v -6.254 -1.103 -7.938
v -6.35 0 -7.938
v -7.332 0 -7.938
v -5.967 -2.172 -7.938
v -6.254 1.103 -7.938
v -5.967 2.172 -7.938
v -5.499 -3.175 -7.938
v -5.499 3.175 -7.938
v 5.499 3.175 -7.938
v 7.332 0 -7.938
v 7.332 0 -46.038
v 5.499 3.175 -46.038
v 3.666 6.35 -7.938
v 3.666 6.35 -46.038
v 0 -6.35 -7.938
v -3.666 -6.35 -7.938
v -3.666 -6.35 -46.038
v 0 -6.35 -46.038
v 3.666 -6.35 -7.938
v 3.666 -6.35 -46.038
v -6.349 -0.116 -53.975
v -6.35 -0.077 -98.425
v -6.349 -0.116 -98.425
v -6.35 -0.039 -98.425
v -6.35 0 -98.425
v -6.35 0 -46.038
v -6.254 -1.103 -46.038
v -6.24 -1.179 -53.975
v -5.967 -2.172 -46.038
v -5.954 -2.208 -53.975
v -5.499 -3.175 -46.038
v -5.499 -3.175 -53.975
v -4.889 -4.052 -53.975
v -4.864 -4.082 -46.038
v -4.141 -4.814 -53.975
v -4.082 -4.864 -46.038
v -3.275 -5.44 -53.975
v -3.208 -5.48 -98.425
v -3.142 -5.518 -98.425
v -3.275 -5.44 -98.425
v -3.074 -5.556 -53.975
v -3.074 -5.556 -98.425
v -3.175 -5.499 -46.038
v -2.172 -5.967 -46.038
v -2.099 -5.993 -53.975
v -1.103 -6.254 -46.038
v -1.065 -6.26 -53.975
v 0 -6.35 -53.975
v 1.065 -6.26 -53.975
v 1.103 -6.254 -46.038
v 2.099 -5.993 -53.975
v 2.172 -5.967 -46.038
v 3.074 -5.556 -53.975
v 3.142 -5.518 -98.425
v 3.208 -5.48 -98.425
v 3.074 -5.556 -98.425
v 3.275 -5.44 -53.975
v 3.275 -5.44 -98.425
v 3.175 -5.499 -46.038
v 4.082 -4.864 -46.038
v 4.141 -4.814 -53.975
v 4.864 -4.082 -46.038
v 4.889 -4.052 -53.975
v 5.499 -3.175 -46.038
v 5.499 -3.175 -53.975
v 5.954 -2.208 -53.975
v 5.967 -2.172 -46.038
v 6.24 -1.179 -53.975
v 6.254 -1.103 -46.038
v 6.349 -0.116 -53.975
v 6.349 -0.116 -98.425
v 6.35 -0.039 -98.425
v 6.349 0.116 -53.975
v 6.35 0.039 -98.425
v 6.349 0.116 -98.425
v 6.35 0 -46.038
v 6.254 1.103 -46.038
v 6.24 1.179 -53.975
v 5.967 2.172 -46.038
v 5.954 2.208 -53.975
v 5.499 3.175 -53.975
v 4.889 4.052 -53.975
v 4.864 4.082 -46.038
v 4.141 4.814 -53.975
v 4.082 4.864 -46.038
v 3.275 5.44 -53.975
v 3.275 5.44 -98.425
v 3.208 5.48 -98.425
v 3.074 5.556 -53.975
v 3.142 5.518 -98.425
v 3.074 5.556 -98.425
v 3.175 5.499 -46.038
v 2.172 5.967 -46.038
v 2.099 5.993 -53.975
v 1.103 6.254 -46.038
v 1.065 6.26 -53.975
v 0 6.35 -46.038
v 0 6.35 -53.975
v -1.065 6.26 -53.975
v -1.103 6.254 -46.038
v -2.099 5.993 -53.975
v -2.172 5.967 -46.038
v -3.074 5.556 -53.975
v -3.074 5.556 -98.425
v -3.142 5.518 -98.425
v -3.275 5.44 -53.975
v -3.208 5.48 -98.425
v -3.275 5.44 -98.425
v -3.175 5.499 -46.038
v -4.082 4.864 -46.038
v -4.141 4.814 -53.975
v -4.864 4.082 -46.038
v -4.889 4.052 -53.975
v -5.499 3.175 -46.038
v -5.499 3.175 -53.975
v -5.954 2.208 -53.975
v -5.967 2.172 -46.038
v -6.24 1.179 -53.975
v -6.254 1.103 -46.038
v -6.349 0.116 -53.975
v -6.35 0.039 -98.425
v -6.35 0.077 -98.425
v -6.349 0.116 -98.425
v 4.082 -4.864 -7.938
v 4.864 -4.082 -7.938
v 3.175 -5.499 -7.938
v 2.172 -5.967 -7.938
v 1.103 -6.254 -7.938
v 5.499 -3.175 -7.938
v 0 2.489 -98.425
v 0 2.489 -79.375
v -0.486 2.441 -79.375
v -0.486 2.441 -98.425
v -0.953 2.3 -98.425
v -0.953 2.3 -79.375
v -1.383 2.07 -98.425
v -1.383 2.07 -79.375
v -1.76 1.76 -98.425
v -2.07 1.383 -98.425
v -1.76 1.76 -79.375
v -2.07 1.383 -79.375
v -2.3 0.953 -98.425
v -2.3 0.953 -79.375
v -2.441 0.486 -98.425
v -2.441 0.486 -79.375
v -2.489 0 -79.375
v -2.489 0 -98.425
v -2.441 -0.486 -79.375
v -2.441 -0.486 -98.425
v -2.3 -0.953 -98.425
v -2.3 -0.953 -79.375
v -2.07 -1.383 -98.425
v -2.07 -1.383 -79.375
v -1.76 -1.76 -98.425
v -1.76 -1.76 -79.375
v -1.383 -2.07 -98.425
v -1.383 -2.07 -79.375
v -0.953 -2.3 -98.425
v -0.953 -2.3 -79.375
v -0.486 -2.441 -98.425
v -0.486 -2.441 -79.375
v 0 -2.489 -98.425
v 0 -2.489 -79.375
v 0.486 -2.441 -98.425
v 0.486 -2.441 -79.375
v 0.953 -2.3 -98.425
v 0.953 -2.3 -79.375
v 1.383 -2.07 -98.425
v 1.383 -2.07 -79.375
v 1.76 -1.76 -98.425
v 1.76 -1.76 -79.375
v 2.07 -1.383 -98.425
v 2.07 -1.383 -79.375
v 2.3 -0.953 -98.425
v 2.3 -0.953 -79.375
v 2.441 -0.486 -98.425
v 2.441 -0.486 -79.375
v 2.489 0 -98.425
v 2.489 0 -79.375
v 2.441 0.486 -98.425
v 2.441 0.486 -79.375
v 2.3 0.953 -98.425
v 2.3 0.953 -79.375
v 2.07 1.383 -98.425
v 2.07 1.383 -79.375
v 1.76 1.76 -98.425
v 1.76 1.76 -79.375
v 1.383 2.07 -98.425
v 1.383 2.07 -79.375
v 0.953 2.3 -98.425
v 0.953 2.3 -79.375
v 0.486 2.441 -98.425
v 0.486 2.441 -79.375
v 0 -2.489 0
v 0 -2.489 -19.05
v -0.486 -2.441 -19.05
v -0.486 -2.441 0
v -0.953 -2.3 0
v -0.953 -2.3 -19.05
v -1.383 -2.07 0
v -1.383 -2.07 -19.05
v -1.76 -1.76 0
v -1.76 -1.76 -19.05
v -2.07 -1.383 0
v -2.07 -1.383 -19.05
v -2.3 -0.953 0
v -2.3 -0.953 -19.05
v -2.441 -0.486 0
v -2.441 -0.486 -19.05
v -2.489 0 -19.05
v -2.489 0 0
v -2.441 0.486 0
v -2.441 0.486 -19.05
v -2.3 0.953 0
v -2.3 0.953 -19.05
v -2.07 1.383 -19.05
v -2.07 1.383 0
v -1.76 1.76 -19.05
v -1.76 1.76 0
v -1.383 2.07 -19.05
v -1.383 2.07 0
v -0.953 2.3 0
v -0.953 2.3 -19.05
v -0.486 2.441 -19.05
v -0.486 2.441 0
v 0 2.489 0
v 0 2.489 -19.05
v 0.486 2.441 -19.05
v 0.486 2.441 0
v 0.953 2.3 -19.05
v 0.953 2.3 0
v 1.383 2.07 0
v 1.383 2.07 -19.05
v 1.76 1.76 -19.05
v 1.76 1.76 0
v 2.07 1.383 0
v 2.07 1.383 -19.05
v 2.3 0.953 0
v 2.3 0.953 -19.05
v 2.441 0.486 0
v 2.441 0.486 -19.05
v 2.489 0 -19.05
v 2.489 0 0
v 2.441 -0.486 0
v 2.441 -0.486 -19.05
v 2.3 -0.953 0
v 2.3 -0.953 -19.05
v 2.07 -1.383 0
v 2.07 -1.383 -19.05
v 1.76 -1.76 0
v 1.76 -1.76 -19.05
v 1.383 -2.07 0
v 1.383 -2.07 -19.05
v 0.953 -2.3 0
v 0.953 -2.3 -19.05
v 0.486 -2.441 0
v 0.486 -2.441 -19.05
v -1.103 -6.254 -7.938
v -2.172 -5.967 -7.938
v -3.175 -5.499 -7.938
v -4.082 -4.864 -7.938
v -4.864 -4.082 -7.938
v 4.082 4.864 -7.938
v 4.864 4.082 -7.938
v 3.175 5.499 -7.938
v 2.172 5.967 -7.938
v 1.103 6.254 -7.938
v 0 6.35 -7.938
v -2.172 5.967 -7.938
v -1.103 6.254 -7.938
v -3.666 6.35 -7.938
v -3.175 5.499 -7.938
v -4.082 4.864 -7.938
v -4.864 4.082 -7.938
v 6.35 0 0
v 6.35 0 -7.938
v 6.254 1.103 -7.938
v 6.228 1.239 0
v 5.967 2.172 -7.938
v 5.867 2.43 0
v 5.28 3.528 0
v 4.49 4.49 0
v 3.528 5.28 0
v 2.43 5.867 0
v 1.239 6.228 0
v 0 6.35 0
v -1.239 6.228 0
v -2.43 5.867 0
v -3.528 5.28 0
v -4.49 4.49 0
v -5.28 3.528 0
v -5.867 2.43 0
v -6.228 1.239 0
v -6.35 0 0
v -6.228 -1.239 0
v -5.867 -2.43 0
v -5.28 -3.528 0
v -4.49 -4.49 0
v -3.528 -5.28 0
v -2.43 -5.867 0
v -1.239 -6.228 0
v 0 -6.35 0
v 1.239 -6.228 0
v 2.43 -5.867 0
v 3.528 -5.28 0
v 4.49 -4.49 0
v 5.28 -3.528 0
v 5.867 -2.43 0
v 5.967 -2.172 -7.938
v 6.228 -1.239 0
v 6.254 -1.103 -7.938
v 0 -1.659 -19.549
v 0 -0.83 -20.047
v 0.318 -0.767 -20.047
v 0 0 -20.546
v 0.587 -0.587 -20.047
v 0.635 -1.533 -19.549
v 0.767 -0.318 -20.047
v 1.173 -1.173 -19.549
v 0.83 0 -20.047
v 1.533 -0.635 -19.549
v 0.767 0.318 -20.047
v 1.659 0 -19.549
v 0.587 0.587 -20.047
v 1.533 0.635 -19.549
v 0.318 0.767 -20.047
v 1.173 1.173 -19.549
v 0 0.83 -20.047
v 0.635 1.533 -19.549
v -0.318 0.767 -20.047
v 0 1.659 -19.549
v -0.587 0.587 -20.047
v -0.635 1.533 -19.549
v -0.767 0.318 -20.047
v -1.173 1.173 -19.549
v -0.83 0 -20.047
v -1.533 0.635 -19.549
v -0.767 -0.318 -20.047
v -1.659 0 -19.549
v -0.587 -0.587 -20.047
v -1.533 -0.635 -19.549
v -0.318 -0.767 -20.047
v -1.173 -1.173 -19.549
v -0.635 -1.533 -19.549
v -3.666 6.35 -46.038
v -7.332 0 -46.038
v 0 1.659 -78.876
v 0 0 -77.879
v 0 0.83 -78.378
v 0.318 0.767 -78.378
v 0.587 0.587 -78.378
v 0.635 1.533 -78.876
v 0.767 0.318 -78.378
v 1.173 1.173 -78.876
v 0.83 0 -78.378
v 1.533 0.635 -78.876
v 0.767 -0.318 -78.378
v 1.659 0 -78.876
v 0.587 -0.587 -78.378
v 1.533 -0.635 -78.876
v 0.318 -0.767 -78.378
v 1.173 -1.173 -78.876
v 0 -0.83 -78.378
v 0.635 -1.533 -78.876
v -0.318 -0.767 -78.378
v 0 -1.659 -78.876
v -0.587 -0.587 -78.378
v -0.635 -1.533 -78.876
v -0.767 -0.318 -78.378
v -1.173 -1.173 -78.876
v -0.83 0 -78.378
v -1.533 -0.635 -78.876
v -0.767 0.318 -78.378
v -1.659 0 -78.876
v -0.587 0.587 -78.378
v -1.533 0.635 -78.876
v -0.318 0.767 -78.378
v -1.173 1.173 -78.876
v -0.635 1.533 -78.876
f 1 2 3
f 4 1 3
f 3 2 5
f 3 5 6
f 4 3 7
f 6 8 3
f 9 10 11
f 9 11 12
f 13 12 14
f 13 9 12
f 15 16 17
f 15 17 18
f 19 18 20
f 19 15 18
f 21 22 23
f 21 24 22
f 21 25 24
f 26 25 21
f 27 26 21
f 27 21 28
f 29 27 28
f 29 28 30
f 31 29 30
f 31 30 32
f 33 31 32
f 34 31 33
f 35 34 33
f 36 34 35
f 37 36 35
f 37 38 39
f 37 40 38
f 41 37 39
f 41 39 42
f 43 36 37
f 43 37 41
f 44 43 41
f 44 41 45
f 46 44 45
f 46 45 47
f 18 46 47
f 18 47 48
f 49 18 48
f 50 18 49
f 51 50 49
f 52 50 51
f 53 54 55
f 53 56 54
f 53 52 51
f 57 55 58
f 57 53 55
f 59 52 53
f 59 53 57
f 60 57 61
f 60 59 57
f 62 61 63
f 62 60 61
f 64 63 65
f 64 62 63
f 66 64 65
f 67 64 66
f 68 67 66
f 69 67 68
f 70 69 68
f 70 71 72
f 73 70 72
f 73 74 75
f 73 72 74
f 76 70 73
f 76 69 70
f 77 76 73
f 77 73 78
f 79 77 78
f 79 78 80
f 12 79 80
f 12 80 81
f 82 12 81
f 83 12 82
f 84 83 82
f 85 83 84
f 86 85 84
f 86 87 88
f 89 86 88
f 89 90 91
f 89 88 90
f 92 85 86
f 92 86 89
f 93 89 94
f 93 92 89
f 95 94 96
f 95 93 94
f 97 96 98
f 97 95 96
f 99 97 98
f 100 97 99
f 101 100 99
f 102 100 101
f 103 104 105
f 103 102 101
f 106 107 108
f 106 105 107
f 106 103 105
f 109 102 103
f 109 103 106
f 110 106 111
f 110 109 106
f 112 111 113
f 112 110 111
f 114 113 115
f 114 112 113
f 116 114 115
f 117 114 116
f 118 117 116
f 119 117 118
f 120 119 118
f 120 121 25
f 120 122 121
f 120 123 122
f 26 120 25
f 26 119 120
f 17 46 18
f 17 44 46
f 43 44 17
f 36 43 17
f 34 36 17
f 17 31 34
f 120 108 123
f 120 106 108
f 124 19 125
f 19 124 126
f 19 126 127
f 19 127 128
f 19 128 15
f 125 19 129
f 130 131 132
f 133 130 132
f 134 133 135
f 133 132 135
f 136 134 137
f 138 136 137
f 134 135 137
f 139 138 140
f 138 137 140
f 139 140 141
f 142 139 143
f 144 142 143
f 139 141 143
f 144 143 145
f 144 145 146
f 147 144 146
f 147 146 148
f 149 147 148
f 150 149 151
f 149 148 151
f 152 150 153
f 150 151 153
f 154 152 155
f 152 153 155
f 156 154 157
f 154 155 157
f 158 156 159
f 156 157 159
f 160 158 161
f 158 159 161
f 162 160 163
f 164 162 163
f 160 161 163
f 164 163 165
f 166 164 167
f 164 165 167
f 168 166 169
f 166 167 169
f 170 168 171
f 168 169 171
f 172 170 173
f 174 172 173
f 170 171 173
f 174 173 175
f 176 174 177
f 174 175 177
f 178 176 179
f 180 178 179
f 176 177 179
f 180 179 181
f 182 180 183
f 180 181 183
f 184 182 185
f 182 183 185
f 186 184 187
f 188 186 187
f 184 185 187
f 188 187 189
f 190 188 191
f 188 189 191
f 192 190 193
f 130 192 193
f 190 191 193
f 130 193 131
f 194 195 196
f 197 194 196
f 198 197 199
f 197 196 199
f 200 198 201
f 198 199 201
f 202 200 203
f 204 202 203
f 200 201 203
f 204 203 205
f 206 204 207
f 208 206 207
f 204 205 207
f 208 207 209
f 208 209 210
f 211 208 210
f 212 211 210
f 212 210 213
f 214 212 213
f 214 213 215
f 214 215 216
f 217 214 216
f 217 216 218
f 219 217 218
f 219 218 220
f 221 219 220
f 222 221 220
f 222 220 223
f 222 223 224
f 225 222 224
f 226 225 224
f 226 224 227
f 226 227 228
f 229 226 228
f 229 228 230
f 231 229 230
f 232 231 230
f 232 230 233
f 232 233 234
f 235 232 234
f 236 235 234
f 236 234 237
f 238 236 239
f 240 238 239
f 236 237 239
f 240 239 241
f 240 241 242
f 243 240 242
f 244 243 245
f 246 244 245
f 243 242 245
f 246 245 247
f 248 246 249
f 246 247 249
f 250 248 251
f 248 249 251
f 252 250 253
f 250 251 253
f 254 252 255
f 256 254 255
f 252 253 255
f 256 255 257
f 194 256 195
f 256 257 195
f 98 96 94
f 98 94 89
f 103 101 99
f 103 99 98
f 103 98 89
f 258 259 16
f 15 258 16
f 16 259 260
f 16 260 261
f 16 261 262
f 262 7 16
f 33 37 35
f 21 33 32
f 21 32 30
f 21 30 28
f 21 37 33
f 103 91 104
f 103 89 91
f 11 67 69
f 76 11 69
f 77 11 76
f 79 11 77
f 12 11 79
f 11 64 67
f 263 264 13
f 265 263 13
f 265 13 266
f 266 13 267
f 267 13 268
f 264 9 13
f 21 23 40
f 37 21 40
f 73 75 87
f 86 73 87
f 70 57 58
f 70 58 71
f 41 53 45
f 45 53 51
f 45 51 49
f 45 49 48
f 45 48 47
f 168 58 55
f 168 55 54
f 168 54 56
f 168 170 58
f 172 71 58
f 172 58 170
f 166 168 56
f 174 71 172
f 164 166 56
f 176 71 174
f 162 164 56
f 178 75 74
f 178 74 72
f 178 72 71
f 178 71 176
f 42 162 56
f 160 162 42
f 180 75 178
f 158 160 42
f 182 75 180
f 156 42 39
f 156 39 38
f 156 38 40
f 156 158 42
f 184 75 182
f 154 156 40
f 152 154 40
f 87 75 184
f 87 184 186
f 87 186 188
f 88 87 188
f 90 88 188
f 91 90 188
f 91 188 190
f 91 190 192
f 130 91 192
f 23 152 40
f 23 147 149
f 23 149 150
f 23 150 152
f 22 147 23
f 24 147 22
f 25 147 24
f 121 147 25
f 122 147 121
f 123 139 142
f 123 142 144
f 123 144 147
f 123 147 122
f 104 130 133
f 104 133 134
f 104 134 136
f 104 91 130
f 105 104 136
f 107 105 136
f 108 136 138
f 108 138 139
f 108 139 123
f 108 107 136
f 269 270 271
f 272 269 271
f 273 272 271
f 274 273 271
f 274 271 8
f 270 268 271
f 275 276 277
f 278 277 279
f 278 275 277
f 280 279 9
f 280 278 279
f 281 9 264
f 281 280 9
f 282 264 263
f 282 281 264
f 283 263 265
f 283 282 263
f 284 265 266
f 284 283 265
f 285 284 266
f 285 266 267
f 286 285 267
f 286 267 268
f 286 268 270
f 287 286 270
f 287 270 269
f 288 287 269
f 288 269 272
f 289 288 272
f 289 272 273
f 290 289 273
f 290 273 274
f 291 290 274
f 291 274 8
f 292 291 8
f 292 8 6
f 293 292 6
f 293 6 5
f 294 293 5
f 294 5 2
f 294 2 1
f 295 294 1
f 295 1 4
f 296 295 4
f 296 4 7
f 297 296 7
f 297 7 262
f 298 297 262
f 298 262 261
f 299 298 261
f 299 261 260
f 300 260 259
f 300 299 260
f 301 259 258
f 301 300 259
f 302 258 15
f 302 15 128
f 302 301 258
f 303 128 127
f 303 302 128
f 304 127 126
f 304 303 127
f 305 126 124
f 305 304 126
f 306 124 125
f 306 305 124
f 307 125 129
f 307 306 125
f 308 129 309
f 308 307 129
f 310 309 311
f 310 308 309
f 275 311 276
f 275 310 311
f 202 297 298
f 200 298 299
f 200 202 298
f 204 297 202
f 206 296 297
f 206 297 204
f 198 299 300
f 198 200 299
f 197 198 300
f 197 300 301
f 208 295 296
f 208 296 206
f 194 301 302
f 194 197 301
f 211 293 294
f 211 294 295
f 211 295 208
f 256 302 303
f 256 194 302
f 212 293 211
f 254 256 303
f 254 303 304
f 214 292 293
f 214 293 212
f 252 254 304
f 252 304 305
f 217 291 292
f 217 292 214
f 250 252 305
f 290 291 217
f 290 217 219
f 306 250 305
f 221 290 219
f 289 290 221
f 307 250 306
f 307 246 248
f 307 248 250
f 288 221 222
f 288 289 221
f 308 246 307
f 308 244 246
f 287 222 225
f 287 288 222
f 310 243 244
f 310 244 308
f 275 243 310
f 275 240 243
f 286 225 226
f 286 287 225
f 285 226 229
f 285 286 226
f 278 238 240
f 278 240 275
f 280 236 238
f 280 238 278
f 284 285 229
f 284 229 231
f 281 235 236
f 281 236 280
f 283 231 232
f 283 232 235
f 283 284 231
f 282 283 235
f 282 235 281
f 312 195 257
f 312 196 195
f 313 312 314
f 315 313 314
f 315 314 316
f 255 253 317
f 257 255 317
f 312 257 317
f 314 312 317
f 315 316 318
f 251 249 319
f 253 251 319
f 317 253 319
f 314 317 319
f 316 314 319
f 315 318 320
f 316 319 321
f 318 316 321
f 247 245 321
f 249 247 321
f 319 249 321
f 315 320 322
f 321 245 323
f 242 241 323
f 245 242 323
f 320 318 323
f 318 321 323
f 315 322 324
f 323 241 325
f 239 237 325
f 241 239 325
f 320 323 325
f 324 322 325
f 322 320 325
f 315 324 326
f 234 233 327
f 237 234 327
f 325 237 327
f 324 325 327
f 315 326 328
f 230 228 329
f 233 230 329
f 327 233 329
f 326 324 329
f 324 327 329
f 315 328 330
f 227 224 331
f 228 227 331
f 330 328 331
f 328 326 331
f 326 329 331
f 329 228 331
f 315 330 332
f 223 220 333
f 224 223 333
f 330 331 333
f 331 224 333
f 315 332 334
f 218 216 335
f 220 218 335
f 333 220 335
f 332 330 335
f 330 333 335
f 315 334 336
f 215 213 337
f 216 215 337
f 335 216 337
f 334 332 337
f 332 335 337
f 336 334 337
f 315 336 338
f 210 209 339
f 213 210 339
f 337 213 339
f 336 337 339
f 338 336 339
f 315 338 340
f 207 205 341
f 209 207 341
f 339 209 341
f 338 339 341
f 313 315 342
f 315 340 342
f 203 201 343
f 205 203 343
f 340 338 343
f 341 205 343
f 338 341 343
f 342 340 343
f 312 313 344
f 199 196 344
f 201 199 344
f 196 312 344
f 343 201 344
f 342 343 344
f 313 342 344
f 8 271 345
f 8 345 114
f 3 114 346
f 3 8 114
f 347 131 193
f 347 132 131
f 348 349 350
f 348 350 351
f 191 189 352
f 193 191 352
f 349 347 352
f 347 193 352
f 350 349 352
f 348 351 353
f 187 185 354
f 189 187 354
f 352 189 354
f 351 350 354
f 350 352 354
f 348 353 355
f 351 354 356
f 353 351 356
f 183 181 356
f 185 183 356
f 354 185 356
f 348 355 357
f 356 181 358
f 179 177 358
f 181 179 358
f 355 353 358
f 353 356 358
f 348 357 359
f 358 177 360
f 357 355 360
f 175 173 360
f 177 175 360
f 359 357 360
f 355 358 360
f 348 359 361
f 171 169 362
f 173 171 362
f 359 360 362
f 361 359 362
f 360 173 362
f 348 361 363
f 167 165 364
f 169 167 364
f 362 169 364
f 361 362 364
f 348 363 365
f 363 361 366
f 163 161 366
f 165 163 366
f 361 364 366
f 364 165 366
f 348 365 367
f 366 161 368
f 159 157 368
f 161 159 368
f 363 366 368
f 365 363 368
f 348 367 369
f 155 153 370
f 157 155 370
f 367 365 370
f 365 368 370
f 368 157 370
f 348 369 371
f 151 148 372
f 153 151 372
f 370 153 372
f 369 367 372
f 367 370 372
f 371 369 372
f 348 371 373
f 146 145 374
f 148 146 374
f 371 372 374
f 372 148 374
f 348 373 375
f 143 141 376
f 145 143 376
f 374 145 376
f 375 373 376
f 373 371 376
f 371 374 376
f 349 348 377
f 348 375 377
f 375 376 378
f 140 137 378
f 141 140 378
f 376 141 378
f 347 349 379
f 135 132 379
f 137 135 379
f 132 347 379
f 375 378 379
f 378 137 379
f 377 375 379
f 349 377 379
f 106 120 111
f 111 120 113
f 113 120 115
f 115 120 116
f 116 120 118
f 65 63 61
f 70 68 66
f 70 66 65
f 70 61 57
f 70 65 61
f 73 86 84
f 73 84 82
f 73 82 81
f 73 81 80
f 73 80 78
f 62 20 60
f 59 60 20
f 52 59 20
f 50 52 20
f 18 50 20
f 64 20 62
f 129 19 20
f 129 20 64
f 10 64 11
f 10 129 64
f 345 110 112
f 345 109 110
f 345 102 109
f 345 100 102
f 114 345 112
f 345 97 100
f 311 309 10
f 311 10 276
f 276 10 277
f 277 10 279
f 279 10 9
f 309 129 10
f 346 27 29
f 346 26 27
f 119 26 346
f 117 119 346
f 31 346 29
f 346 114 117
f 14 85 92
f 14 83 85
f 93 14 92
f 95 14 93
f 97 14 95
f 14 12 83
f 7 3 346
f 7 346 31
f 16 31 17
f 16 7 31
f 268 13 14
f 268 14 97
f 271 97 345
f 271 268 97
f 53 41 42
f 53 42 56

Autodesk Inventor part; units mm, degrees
ref_plane "YZ Plane" through (0, 0, 0) normal (1, 0, 0) x (0, 1, 0)
ref_plane "XZ Plane" through (0, 0, 0) normal (0, 1, 0) x (-1, 0, 0)
ref_plane "XY Plane" through (0, 0, 0) normal (0, 0, 1) x (1, 0, 0)
sketch "Sketch1" plane through (0, 0, 0) normal (0, 0, 1) x (1, 0, 0)
  circle A0 centre (0, 0) radius 6.35
  dimension "d0" = 12.7
extrude "Internal 1/2\" Round" add sketch "Sketch1" against normal blind 7.9375
sketch "Sketch2" plane through (0, 0, -7.9375) normal (0, 0, -1) x (-1, 0, 0)
  circle A0 centre (0, 0) radius 6.35 projected
  line L0 (3.6662, 6.35) -> (7.3323, 0)
  line L1 (7.3323, 0) -> (3.6662, -6.35)
  line L2 (3.6662, -6.35) -> (-3.6662, -6.35)
  line L3 (-3.6662, -6.35) -> (-7.3323, 0)
  line L4 (-7.3323, 0) -> (-3.6662, 6.35)
  line L5 (-3.6662, 6.35) -> (3.6662, 6.35)
extrude "Pulley 1/2\" Hex" add sketch "Sketch2" along normal blind 38.1
sketch "Sketch3" plane through (0, 0, -46.0375) normal (0, 0, -1) x (-1, 0, 0)
  circle A0 centre (0, 0) radius 6.35
extrude "External 1/2\" Round" add sketch "Sketch3" along normal blind 7.9375
sketch "Sketch4" plane through (0, 0, -53.975) normal (0, 0, -1) x (-1, 0, 0)
  circle A0 centre (0, 0) radius 6.35 projected
  line L0 (3.2748, 5.4404) -> (6.3489, 0.1158)
  line L1 (6.3489, -0.1158) -> (3.2748, -5.4404)
  line L2 (3.0742, -5.5563) -> (-3.0742, -5.5563)
  line L3 (-3.2748, -5.4404) -> (-6.3489, -0.1158)
  line L4 (-6.3489, 0.1158) -> (-3.2748, 5.4404)
  line L5 (-3.0742, 5.5562) -> (3.0742, 5.5562)
  dimension "d7" = 11.1125
extrude "Wheel 7/16\" Hex" add sketch "Sketch4" along normal blind 44.45 contours A0 L1 L2 L3 L4 L5 L0
sketch "Sketch6" plane through (0, 0, -98.425) normal (0, 0, -1) x (-1, 0, 0)
  arc A0 (6.3489, -0.1158) -> (6.3489, 0.1158) centre (0, 0) ccw projected
sketch "Sketch5" plane through (0, 0, 0) normal (0, 0, 1) x (1, 0, 0)
  circle A0 centre (0, 0) radius 6.35 projected
hole "Internal 1/4\"-20 Tap" at (0, 0, 0) direction (0, 0, -1) diameter 4.9784 depth 19.05 tip angle 118 thread size "1/4-20 UNC" class "2B" standard "ANSI Unified Screw Threads"
hole "External 1/4\"-20 Tap" at (0, 0, -98.425) direction (0, 0, 1) diameter 4.9784 depth 19.05 tip angle 118 thread size "1/4-20 UNC" class "2B" standard "ANSI Unified Screw Threads"
properties part number "Live Axle" material "Aluminum 7075"
